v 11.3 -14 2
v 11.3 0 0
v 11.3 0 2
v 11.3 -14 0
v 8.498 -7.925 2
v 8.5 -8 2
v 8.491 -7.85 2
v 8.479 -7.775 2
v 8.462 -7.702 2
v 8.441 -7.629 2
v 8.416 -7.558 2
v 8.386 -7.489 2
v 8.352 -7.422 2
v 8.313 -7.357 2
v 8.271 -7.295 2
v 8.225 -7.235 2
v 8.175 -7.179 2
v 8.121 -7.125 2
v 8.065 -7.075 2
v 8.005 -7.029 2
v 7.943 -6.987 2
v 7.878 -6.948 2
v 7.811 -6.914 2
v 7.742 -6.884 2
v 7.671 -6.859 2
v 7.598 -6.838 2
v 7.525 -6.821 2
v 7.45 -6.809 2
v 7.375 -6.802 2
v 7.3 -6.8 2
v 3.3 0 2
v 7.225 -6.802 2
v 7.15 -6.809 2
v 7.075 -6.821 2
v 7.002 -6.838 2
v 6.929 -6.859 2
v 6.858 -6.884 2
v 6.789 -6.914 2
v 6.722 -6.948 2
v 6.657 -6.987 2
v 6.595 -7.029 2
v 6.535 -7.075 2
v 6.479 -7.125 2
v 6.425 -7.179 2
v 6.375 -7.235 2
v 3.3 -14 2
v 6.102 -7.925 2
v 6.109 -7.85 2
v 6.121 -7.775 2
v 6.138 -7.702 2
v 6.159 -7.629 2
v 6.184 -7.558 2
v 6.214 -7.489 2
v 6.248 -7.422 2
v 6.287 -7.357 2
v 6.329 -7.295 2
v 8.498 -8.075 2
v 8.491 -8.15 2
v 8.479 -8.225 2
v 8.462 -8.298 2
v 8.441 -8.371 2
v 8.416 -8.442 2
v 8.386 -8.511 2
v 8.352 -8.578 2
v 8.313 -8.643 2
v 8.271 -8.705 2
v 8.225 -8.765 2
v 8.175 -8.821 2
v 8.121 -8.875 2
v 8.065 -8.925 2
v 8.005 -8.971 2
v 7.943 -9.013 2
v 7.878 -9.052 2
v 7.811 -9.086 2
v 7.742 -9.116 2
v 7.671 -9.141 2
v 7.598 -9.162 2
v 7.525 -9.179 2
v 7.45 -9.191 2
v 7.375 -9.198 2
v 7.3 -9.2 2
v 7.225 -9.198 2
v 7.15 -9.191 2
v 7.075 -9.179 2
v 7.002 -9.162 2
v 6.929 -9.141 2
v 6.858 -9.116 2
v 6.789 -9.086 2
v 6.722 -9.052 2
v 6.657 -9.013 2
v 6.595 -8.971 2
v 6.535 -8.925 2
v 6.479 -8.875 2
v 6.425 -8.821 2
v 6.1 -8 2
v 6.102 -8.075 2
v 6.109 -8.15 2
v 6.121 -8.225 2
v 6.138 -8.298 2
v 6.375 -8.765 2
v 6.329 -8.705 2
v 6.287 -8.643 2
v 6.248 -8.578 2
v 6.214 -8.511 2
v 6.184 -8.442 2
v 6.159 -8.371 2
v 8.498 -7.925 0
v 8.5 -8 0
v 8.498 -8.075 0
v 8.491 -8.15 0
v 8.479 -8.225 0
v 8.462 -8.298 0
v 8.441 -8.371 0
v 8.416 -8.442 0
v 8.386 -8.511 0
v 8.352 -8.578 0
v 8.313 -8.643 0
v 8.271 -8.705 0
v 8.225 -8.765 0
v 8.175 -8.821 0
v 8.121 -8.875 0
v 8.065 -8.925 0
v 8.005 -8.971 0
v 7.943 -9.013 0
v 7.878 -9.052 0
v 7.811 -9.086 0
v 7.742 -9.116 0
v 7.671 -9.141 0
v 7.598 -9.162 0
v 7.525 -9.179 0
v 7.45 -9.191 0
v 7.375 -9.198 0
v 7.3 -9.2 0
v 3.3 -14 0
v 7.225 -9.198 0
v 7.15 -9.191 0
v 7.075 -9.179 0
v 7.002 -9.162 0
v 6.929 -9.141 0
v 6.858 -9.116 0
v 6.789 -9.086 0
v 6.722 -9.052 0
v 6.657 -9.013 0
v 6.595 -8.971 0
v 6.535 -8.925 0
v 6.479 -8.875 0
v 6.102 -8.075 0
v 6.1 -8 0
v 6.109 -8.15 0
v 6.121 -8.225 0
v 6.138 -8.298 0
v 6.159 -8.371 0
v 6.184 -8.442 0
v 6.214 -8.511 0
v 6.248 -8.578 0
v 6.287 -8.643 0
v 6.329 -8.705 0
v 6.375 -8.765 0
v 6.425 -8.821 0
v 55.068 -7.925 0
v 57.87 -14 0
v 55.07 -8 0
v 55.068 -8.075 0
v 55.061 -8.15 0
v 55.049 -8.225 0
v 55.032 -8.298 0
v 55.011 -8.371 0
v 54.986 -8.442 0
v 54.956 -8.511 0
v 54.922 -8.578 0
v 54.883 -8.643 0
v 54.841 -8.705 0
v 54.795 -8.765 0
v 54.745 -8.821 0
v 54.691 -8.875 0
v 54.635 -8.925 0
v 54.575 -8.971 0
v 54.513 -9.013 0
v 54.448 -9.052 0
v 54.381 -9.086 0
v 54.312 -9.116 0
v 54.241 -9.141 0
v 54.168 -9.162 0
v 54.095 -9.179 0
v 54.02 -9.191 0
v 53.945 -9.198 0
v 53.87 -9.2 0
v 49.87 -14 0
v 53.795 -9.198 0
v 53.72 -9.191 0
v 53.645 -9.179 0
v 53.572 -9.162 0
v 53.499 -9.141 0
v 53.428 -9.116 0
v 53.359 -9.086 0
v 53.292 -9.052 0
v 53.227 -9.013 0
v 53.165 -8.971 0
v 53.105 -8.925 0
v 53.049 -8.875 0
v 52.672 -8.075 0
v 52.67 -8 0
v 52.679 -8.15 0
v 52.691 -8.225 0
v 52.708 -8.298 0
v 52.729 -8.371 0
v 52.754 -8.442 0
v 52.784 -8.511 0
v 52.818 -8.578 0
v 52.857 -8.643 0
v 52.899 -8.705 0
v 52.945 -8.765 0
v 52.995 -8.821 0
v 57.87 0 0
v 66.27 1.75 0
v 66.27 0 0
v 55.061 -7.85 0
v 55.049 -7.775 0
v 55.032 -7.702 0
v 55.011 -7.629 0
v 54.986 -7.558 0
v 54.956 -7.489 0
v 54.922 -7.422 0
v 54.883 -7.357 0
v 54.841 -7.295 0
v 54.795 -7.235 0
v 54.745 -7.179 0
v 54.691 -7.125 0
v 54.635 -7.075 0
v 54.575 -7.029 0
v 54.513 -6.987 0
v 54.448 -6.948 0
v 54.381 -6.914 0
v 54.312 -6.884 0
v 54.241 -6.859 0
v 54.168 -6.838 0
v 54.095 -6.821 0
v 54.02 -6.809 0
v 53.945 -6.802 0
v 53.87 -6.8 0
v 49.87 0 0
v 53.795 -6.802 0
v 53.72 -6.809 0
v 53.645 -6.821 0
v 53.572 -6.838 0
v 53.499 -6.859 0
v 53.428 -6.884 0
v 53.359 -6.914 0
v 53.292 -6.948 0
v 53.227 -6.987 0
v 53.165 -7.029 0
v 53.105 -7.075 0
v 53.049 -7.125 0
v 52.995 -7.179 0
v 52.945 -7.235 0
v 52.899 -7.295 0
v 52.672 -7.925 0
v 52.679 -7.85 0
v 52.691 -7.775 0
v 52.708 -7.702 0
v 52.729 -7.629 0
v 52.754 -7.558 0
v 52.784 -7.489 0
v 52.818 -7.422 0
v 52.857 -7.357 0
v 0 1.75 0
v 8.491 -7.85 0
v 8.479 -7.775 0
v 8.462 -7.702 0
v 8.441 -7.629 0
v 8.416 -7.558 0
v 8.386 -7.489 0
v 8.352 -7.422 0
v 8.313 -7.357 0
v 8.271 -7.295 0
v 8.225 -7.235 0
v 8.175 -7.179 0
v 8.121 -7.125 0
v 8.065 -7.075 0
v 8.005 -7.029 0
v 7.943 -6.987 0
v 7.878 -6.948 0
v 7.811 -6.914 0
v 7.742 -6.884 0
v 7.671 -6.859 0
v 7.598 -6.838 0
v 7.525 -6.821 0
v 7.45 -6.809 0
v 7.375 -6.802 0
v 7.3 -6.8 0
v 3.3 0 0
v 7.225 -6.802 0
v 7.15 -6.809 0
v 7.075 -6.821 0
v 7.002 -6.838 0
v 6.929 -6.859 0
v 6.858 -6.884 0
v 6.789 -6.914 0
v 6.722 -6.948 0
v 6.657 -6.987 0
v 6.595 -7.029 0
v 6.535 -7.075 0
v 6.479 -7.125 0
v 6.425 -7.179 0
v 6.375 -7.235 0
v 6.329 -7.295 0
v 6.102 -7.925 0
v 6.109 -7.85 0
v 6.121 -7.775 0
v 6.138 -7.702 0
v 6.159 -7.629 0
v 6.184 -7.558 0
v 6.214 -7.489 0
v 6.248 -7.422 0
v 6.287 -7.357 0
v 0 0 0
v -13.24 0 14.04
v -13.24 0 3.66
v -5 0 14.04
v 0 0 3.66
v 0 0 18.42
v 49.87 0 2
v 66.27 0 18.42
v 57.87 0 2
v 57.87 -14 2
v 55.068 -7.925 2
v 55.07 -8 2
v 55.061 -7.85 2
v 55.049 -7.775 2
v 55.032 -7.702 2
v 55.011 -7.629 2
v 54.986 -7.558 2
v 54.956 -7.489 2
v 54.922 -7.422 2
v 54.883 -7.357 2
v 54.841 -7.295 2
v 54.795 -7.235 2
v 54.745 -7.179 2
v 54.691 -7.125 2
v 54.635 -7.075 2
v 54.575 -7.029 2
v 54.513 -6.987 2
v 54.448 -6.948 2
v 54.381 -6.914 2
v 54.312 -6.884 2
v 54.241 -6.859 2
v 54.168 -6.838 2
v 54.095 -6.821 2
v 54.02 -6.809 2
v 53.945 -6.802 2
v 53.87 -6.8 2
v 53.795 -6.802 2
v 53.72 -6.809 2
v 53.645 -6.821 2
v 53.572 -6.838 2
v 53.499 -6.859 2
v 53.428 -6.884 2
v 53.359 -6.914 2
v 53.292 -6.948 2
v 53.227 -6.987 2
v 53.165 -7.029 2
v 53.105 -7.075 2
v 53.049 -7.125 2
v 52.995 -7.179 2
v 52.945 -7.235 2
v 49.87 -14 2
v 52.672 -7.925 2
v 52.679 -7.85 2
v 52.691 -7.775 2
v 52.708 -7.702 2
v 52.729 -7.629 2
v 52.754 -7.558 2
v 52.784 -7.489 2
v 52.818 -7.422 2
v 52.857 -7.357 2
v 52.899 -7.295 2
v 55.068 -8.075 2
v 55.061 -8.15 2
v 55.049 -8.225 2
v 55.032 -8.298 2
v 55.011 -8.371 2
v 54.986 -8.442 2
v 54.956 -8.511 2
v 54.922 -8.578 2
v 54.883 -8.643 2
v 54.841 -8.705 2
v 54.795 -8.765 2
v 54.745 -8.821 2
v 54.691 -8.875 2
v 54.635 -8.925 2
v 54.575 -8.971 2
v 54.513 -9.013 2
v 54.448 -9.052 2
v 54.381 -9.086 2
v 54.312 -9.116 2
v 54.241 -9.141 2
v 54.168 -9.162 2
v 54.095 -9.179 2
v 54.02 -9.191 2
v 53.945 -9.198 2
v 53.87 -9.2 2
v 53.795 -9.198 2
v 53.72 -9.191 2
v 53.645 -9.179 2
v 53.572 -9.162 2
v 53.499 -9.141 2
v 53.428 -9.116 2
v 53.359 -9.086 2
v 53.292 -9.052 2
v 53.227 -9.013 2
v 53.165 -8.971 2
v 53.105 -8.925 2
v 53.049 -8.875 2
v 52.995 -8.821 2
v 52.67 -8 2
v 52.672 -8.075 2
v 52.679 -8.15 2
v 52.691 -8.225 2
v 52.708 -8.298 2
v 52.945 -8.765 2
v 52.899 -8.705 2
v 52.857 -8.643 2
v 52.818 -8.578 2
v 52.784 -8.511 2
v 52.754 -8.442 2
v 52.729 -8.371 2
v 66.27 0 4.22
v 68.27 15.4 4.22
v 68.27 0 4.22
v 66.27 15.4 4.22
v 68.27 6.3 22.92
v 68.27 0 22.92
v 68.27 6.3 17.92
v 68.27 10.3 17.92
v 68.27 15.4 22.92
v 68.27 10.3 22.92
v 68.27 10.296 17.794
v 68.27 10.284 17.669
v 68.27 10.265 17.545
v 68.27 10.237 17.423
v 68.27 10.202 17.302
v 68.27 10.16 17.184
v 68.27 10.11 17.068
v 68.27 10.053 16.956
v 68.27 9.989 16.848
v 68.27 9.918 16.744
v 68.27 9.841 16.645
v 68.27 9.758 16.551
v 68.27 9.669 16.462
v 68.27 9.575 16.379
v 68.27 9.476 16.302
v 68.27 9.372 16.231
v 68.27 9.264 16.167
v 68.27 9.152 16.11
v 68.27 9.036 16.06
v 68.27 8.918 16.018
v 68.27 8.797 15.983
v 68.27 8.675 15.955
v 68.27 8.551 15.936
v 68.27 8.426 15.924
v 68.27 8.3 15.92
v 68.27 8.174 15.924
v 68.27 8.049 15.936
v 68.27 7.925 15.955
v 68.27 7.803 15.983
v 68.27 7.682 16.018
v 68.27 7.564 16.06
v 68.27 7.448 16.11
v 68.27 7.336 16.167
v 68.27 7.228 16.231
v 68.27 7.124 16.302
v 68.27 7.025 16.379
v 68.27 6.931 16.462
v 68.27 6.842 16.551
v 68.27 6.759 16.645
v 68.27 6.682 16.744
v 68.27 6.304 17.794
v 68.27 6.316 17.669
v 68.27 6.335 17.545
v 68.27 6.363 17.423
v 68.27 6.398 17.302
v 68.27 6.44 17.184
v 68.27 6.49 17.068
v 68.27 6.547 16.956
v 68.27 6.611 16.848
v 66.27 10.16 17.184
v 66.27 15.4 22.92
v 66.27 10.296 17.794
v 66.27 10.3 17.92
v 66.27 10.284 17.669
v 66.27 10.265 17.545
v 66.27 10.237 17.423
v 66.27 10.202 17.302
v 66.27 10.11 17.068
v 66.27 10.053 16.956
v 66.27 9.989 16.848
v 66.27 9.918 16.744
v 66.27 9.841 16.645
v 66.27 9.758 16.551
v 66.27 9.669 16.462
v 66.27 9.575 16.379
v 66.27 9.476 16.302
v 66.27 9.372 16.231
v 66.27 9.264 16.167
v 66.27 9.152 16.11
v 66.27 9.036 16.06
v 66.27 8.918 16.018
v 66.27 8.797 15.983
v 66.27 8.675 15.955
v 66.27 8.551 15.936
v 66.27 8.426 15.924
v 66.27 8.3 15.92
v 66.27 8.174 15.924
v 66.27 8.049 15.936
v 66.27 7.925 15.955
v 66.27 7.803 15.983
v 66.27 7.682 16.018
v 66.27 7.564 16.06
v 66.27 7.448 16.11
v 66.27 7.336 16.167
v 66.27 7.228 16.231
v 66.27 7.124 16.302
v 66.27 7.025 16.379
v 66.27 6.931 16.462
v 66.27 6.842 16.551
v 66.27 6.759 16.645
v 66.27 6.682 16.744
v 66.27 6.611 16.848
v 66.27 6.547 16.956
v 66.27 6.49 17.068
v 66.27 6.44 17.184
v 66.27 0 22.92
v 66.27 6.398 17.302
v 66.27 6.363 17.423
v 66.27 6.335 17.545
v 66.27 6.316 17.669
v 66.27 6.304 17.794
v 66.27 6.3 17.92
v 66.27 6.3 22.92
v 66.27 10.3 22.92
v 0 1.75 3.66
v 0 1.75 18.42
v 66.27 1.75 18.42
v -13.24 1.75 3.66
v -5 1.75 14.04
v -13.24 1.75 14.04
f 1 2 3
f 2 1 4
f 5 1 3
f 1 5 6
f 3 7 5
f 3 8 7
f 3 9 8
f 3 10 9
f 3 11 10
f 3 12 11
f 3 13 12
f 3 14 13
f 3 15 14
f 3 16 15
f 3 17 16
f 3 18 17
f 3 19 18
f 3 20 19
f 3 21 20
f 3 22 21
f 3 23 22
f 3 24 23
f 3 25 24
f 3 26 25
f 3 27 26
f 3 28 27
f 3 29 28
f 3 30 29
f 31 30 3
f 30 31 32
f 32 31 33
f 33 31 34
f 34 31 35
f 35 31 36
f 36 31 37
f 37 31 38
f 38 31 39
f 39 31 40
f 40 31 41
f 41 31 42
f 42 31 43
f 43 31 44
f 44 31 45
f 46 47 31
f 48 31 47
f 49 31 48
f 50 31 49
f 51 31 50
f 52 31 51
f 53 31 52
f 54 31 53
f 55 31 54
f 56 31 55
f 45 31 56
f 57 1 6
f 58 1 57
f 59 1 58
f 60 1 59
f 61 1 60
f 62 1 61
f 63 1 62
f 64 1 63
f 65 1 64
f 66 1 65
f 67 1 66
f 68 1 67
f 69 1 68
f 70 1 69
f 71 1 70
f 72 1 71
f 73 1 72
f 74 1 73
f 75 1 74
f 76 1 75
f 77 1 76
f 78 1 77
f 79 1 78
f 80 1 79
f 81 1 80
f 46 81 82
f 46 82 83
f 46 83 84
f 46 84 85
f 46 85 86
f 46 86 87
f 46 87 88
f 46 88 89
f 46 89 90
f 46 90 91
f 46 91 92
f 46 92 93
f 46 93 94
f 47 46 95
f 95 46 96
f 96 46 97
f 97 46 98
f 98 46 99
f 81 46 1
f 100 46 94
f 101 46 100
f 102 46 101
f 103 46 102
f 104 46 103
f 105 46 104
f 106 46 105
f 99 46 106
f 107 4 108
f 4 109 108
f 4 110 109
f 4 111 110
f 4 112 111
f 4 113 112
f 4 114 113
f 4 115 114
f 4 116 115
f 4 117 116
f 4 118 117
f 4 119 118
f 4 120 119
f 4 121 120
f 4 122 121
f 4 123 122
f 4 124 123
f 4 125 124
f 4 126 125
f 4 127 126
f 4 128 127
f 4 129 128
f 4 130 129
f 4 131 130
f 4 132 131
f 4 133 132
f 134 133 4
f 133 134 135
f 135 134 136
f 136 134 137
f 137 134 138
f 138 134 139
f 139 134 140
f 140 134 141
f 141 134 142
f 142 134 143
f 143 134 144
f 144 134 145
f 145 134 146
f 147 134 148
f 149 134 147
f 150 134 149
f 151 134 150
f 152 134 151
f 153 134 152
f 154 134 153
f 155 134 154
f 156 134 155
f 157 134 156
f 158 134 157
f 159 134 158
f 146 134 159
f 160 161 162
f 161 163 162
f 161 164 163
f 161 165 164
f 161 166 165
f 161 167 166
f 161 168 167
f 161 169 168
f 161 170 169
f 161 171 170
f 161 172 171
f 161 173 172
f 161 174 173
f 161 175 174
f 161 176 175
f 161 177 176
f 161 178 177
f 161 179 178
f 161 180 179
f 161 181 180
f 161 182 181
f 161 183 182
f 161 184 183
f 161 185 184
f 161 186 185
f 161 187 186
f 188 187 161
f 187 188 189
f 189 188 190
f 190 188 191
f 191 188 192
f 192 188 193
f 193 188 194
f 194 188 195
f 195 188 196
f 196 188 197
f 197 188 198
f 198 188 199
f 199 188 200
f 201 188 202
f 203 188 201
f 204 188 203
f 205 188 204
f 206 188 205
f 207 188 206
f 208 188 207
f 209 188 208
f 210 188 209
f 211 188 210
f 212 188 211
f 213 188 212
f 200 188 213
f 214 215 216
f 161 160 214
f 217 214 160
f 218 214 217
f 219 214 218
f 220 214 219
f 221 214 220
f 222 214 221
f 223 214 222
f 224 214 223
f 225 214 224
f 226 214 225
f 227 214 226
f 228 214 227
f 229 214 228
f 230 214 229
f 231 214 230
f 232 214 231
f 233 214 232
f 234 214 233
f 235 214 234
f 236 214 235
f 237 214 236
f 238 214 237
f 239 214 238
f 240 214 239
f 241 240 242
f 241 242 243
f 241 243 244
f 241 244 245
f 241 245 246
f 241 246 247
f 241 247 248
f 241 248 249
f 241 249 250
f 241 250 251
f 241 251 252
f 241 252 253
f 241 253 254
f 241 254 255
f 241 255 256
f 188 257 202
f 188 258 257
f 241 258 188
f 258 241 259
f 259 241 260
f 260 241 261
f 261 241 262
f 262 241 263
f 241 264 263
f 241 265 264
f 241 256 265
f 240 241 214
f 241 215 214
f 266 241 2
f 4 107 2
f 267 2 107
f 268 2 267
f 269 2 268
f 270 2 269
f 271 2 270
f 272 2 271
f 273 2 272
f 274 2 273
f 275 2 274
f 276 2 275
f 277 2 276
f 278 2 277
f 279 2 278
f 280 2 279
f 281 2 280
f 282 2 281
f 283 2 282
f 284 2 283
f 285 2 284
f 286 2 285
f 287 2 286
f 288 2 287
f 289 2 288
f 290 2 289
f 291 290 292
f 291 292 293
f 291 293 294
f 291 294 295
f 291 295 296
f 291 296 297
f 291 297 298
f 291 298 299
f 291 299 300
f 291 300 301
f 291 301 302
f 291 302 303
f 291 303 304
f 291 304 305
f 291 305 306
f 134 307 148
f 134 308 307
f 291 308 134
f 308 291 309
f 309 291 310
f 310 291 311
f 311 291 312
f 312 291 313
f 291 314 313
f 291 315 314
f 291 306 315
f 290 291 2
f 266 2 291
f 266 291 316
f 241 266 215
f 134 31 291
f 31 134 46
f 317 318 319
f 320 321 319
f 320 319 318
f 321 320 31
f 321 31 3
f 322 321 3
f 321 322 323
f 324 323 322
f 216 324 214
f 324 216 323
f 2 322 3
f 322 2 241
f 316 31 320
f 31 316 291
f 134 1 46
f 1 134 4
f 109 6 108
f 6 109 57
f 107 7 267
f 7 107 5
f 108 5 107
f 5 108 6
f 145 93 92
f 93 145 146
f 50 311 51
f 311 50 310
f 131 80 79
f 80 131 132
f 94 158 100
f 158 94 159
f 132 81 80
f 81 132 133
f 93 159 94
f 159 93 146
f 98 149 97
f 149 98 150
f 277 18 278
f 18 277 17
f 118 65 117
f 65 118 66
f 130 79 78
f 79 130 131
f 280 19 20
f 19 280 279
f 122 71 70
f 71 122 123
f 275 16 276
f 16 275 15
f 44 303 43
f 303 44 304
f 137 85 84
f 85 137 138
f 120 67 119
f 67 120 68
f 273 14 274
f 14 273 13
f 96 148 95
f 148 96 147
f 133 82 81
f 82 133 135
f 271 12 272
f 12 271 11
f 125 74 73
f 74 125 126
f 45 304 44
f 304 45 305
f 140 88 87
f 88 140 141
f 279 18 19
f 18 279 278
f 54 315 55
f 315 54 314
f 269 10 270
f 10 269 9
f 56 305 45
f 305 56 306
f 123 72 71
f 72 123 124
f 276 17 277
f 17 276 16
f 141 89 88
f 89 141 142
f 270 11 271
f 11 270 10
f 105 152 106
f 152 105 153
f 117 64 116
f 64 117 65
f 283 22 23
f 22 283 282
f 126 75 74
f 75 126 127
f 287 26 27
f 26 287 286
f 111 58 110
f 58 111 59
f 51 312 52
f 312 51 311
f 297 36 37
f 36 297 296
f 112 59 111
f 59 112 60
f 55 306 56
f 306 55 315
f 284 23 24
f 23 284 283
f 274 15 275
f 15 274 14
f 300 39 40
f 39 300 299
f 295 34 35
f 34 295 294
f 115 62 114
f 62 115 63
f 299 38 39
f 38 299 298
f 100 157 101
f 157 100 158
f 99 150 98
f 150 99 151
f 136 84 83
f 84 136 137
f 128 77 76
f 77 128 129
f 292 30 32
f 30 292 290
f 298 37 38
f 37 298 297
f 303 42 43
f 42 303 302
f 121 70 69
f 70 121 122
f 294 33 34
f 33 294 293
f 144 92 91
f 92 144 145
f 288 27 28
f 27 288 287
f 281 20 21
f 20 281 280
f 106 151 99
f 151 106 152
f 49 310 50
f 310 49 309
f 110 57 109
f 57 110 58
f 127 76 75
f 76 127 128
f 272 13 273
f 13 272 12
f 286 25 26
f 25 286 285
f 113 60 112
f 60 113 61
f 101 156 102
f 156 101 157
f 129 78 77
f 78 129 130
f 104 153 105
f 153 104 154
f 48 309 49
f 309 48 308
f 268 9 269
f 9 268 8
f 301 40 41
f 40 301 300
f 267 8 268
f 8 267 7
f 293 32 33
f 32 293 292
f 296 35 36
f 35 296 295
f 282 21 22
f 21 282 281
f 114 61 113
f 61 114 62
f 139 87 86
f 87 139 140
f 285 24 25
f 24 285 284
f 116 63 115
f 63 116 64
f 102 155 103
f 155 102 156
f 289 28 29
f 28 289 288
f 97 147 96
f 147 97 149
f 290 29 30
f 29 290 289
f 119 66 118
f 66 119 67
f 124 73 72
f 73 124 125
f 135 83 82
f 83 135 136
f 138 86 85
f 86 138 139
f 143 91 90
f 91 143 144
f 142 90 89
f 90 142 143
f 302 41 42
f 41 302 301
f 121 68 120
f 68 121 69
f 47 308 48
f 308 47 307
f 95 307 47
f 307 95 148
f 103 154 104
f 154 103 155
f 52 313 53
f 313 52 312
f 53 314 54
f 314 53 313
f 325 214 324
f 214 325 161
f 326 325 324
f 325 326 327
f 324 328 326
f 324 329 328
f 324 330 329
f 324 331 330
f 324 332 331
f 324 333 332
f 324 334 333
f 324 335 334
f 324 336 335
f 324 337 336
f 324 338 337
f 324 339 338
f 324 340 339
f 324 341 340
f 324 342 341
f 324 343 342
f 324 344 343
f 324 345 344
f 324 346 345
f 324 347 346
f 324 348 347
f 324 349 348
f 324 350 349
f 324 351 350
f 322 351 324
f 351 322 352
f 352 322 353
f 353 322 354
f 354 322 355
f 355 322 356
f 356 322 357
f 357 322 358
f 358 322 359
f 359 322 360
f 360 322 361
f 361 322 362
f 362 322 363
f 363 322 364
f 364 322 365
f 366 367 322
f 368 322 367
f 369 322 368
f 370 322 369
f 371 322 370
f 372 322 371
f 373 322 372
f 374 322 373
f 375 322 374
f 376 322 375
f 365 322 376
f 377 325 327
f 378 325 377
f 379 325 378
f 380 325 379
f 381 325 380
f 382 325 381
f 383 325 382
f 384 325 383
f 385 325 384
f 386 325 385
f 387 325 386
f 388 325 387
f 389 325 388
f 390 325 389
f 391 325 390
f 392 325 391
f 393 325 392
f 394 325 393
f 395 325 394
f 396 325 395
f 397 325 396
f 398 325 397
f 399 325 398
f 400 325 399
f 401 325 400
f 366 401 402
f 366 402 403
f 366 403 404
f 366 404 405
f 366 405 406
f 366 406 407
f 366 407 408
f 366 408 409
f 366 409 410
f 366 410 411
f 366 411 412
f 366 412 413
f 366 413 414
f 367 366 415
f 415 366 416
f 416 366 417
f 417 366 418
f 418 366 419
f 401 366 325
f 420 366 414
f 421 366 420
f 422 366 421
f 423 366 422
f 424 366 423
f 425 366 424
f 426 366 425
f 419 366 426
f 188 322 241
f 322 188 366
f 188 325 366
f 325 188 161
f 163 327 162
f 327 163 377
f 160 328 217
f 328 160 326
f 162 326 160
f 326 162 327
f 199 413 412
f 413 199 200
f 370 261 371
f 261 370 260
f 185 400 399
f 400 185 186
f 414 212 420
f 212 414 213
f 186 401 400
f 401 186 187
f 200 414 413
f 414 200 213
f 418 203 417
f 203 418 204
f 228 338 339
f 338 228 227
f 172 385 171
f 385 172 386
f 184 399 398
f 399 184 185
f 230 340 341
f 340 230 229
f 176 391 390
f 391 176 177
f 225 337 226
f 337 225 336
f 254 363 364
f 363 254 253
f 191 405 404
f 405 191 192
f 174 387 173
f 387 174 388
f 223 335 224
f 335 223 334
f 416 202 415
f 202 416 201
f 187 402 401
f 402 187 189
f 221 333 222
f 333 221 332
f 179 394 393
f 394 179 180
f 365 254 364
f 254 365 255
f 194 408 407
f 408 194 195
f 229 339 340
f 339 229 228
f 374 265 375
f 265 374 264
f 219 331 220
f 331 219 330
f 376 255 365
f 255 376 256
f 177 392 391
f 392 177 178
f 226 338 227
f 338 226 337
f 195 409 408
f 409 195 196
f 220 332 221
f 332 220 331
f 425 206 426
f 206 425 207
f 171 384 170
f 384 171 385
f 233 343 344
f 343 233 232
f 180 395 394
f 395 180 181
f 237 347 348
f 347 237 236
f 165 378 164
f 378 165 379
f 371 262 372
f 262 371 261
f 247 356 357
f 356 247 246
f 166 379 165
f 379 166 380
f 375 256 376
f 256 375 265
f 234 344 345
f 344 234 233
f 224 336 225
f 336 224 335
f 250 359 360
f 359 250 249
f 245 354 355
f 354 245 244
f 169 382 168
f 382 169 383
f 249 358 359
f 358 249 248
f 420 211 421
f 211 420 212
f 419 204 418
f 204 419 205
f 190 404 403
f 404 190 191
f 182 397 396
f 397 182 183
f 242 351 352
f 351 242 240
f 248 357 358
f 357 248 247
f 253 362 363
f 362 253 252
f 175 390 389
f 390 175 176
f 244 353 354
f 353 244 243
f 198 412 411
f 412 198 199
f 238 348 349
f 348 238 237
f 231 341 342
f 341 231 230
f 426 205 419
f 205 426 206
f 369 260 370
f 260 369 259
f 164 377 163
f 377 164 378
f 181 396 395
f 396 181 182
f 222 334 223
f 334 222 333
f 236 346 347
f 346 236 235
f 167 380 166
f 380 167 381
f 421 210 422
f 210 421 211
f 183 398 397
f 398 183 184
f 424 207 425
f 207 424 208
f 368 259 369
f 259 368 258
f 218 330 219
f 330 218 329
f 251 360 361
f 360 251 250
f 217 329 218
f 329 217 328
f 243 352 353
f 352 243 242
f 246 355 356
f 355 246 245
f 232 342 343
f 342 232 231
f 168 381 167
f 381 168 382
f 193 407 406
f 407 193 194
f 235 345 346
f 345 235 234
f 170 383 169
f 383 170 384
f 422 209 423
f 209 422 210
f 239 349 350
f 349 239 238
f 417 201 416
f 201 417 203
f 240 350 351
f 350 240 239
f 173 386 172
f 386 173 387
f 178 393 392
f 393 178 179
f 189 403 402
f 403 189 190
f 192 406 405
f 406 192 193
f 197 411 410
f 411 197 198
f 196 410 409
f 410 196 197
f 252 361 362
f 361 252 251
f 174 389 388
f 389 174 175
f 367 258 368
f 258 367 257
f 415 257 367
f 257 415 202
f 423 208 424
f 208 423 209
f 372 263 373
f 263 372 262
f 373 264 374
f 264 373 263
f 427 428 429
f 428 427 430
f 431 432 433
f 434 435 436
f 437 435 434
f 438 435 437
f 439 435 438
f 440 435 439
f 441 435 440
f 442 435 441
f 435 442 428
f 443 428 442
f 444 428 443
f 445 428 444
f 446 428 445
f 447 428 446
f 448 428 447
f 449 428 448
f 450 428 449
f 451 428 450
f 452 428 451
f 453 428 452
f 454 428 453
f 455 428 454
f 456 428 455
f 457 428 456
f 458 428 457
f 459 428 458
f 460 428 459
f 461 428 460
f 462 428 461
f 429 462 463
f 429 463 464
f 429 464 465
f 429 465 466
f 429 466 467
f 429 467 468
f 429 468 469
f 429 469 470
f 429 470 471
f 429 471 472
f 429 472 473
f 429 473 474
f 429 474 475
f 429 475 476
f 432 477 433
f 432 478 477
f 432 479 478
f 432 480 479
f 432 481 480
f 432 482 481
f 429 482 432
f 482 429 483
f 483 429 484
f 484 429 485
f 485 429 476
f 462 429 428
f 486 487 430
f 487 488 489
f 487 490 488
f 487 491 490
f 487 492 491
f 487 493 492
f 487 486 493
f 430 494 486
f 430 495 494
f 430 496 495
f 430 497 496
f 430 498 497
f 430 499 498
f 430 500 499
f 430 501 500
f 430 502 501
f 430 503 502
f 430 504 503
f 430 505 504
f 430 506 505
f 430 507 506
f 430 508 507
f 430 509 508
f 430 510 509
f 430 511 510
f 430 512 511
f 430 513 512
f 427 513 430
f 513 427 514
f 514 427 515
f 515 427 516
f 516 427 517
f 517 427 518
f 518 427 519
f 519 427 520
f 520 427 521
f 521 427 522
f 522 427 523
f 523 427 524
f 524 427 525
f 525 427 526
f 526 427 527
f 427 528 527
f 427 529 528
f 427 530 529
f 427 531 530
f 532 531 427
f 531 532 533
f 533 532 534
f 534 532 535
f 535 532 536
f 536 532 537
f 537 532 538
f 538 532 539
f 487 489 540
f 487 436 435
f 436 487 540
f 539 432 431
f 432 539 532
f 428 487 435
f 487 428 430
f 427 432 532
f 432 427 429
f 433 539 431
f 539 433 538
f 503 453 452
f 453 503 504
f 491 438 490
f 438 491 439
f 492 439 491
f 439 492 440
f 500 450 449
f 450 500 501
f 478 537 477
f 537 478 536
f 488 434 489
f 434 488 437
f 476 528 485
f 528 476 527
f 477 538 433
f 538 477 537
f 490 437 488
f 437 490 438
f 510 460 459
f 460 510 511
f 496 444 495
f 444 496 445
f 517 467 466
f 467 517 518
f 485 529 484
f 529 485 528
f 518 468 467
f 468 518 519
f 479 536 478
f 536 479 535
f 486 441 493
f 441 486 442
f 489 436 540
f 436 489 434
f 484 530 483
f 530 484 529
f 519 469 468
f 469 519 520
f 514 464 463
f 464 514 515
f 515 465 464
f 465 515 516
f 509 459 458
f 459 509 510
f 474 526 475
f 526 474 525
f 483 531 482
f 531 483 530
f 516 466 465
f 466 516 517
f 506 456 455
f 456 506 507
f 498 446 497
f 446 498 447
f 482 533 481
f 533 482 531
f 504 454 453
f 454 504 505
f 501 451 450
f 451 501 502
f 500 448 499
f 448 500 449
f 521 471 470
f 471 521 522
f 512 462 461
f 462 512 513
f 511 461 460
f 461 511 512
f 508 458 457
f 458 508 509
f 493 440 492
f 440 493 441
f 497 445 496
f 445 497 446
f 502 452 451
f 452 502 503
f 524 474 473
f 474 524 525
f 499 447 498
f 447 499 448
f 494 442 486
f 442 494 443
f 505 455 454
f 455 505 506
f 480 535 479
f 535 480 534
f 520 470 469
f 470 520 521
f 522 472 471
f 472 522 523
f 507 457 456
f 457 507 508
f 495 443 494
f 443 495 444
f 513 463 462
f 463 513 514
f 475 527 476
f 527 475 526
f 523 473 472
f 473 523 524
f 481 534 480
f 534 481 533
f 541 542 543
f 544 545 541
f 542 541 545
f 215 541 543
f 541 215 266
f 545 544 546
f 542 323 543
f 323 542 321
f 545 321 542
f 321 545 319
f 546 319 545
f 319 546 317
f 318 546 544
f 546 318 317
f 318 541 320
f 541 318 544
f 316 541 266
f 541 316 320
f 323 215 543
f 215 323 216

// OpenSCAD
// position of first screw, in respect to card base
A =  7.3;

// distance between the 2 screw centers
B = 46.57;

// distance of the screw from pci bracket
C = 8.0;

// M3 hole diameter
M3= 2.4;

/* [Hidden] */
h_pci_cutout = 66.27;

module plate() {
thick = 1.75;
plug_bottom  =-13.24;
board_bottom =  0.0;
w_pci_cutout = 18.42;
w_connector  = 10.38;
w_margin     =  3.16 + 0.5;
points = [  [plug_bottom, w_margin], 
            [board_bottom, w_margin],
            [board_bottom, 0], 
            [h_pci_cutout, 0],
            [h_pci_cutout, w_pci_cutout],
            [board_bottom, w_pci_cutout],
            [-5, w_margin + w_connector], 
            [ plug_bottom, w_margin + w_connector] ];

translate([ 0, 0, -thick])
linear_extrude(height = thick) {
    polygon( points);
}

}

// fix plate


module fix() {
    half   =  4;
    length = 14;
    thick  =  2;
difference() {
    translate([ -half, -length, 0]) cube( size=[ 2*half, length, thick] );
    translate([ 0, -C, 0]) 
    cylinder (h = 10, r=M3/2, center = true, $fn=100);
}
}




module pci() {
    M4 = 4.0;

    width  = 12.40 + 3;
    length = 18.70;
    thick  =  2;
    shift  = 4.22;
translate([ -( length + shift), 0, 0])
difference() {
    cube( size=[ length, width, thick] );

    translate([ 0, width/2 + 0.6, 0])
    hull() {
        cylinder (h = 10, r=M4/2, center = true, $fn=100);
        translate([ 5, 0, 0])
        cylinder (h = 10, r=M4/2, center = true, $fn=100);
    }
}
}



// make plate front side
color("SkyBlue")
rotate( [ 90, 0, 0]) plate();

// fix plate
color("red") {
translate([ A, 0, 0]) fix();
translate([ A + B, 0, 0]) fix();
}

// pci holder
color("green")
translate([ h_pci_cutout, 0, 0])
rotate( [ 0, 90, 0]) pci();
